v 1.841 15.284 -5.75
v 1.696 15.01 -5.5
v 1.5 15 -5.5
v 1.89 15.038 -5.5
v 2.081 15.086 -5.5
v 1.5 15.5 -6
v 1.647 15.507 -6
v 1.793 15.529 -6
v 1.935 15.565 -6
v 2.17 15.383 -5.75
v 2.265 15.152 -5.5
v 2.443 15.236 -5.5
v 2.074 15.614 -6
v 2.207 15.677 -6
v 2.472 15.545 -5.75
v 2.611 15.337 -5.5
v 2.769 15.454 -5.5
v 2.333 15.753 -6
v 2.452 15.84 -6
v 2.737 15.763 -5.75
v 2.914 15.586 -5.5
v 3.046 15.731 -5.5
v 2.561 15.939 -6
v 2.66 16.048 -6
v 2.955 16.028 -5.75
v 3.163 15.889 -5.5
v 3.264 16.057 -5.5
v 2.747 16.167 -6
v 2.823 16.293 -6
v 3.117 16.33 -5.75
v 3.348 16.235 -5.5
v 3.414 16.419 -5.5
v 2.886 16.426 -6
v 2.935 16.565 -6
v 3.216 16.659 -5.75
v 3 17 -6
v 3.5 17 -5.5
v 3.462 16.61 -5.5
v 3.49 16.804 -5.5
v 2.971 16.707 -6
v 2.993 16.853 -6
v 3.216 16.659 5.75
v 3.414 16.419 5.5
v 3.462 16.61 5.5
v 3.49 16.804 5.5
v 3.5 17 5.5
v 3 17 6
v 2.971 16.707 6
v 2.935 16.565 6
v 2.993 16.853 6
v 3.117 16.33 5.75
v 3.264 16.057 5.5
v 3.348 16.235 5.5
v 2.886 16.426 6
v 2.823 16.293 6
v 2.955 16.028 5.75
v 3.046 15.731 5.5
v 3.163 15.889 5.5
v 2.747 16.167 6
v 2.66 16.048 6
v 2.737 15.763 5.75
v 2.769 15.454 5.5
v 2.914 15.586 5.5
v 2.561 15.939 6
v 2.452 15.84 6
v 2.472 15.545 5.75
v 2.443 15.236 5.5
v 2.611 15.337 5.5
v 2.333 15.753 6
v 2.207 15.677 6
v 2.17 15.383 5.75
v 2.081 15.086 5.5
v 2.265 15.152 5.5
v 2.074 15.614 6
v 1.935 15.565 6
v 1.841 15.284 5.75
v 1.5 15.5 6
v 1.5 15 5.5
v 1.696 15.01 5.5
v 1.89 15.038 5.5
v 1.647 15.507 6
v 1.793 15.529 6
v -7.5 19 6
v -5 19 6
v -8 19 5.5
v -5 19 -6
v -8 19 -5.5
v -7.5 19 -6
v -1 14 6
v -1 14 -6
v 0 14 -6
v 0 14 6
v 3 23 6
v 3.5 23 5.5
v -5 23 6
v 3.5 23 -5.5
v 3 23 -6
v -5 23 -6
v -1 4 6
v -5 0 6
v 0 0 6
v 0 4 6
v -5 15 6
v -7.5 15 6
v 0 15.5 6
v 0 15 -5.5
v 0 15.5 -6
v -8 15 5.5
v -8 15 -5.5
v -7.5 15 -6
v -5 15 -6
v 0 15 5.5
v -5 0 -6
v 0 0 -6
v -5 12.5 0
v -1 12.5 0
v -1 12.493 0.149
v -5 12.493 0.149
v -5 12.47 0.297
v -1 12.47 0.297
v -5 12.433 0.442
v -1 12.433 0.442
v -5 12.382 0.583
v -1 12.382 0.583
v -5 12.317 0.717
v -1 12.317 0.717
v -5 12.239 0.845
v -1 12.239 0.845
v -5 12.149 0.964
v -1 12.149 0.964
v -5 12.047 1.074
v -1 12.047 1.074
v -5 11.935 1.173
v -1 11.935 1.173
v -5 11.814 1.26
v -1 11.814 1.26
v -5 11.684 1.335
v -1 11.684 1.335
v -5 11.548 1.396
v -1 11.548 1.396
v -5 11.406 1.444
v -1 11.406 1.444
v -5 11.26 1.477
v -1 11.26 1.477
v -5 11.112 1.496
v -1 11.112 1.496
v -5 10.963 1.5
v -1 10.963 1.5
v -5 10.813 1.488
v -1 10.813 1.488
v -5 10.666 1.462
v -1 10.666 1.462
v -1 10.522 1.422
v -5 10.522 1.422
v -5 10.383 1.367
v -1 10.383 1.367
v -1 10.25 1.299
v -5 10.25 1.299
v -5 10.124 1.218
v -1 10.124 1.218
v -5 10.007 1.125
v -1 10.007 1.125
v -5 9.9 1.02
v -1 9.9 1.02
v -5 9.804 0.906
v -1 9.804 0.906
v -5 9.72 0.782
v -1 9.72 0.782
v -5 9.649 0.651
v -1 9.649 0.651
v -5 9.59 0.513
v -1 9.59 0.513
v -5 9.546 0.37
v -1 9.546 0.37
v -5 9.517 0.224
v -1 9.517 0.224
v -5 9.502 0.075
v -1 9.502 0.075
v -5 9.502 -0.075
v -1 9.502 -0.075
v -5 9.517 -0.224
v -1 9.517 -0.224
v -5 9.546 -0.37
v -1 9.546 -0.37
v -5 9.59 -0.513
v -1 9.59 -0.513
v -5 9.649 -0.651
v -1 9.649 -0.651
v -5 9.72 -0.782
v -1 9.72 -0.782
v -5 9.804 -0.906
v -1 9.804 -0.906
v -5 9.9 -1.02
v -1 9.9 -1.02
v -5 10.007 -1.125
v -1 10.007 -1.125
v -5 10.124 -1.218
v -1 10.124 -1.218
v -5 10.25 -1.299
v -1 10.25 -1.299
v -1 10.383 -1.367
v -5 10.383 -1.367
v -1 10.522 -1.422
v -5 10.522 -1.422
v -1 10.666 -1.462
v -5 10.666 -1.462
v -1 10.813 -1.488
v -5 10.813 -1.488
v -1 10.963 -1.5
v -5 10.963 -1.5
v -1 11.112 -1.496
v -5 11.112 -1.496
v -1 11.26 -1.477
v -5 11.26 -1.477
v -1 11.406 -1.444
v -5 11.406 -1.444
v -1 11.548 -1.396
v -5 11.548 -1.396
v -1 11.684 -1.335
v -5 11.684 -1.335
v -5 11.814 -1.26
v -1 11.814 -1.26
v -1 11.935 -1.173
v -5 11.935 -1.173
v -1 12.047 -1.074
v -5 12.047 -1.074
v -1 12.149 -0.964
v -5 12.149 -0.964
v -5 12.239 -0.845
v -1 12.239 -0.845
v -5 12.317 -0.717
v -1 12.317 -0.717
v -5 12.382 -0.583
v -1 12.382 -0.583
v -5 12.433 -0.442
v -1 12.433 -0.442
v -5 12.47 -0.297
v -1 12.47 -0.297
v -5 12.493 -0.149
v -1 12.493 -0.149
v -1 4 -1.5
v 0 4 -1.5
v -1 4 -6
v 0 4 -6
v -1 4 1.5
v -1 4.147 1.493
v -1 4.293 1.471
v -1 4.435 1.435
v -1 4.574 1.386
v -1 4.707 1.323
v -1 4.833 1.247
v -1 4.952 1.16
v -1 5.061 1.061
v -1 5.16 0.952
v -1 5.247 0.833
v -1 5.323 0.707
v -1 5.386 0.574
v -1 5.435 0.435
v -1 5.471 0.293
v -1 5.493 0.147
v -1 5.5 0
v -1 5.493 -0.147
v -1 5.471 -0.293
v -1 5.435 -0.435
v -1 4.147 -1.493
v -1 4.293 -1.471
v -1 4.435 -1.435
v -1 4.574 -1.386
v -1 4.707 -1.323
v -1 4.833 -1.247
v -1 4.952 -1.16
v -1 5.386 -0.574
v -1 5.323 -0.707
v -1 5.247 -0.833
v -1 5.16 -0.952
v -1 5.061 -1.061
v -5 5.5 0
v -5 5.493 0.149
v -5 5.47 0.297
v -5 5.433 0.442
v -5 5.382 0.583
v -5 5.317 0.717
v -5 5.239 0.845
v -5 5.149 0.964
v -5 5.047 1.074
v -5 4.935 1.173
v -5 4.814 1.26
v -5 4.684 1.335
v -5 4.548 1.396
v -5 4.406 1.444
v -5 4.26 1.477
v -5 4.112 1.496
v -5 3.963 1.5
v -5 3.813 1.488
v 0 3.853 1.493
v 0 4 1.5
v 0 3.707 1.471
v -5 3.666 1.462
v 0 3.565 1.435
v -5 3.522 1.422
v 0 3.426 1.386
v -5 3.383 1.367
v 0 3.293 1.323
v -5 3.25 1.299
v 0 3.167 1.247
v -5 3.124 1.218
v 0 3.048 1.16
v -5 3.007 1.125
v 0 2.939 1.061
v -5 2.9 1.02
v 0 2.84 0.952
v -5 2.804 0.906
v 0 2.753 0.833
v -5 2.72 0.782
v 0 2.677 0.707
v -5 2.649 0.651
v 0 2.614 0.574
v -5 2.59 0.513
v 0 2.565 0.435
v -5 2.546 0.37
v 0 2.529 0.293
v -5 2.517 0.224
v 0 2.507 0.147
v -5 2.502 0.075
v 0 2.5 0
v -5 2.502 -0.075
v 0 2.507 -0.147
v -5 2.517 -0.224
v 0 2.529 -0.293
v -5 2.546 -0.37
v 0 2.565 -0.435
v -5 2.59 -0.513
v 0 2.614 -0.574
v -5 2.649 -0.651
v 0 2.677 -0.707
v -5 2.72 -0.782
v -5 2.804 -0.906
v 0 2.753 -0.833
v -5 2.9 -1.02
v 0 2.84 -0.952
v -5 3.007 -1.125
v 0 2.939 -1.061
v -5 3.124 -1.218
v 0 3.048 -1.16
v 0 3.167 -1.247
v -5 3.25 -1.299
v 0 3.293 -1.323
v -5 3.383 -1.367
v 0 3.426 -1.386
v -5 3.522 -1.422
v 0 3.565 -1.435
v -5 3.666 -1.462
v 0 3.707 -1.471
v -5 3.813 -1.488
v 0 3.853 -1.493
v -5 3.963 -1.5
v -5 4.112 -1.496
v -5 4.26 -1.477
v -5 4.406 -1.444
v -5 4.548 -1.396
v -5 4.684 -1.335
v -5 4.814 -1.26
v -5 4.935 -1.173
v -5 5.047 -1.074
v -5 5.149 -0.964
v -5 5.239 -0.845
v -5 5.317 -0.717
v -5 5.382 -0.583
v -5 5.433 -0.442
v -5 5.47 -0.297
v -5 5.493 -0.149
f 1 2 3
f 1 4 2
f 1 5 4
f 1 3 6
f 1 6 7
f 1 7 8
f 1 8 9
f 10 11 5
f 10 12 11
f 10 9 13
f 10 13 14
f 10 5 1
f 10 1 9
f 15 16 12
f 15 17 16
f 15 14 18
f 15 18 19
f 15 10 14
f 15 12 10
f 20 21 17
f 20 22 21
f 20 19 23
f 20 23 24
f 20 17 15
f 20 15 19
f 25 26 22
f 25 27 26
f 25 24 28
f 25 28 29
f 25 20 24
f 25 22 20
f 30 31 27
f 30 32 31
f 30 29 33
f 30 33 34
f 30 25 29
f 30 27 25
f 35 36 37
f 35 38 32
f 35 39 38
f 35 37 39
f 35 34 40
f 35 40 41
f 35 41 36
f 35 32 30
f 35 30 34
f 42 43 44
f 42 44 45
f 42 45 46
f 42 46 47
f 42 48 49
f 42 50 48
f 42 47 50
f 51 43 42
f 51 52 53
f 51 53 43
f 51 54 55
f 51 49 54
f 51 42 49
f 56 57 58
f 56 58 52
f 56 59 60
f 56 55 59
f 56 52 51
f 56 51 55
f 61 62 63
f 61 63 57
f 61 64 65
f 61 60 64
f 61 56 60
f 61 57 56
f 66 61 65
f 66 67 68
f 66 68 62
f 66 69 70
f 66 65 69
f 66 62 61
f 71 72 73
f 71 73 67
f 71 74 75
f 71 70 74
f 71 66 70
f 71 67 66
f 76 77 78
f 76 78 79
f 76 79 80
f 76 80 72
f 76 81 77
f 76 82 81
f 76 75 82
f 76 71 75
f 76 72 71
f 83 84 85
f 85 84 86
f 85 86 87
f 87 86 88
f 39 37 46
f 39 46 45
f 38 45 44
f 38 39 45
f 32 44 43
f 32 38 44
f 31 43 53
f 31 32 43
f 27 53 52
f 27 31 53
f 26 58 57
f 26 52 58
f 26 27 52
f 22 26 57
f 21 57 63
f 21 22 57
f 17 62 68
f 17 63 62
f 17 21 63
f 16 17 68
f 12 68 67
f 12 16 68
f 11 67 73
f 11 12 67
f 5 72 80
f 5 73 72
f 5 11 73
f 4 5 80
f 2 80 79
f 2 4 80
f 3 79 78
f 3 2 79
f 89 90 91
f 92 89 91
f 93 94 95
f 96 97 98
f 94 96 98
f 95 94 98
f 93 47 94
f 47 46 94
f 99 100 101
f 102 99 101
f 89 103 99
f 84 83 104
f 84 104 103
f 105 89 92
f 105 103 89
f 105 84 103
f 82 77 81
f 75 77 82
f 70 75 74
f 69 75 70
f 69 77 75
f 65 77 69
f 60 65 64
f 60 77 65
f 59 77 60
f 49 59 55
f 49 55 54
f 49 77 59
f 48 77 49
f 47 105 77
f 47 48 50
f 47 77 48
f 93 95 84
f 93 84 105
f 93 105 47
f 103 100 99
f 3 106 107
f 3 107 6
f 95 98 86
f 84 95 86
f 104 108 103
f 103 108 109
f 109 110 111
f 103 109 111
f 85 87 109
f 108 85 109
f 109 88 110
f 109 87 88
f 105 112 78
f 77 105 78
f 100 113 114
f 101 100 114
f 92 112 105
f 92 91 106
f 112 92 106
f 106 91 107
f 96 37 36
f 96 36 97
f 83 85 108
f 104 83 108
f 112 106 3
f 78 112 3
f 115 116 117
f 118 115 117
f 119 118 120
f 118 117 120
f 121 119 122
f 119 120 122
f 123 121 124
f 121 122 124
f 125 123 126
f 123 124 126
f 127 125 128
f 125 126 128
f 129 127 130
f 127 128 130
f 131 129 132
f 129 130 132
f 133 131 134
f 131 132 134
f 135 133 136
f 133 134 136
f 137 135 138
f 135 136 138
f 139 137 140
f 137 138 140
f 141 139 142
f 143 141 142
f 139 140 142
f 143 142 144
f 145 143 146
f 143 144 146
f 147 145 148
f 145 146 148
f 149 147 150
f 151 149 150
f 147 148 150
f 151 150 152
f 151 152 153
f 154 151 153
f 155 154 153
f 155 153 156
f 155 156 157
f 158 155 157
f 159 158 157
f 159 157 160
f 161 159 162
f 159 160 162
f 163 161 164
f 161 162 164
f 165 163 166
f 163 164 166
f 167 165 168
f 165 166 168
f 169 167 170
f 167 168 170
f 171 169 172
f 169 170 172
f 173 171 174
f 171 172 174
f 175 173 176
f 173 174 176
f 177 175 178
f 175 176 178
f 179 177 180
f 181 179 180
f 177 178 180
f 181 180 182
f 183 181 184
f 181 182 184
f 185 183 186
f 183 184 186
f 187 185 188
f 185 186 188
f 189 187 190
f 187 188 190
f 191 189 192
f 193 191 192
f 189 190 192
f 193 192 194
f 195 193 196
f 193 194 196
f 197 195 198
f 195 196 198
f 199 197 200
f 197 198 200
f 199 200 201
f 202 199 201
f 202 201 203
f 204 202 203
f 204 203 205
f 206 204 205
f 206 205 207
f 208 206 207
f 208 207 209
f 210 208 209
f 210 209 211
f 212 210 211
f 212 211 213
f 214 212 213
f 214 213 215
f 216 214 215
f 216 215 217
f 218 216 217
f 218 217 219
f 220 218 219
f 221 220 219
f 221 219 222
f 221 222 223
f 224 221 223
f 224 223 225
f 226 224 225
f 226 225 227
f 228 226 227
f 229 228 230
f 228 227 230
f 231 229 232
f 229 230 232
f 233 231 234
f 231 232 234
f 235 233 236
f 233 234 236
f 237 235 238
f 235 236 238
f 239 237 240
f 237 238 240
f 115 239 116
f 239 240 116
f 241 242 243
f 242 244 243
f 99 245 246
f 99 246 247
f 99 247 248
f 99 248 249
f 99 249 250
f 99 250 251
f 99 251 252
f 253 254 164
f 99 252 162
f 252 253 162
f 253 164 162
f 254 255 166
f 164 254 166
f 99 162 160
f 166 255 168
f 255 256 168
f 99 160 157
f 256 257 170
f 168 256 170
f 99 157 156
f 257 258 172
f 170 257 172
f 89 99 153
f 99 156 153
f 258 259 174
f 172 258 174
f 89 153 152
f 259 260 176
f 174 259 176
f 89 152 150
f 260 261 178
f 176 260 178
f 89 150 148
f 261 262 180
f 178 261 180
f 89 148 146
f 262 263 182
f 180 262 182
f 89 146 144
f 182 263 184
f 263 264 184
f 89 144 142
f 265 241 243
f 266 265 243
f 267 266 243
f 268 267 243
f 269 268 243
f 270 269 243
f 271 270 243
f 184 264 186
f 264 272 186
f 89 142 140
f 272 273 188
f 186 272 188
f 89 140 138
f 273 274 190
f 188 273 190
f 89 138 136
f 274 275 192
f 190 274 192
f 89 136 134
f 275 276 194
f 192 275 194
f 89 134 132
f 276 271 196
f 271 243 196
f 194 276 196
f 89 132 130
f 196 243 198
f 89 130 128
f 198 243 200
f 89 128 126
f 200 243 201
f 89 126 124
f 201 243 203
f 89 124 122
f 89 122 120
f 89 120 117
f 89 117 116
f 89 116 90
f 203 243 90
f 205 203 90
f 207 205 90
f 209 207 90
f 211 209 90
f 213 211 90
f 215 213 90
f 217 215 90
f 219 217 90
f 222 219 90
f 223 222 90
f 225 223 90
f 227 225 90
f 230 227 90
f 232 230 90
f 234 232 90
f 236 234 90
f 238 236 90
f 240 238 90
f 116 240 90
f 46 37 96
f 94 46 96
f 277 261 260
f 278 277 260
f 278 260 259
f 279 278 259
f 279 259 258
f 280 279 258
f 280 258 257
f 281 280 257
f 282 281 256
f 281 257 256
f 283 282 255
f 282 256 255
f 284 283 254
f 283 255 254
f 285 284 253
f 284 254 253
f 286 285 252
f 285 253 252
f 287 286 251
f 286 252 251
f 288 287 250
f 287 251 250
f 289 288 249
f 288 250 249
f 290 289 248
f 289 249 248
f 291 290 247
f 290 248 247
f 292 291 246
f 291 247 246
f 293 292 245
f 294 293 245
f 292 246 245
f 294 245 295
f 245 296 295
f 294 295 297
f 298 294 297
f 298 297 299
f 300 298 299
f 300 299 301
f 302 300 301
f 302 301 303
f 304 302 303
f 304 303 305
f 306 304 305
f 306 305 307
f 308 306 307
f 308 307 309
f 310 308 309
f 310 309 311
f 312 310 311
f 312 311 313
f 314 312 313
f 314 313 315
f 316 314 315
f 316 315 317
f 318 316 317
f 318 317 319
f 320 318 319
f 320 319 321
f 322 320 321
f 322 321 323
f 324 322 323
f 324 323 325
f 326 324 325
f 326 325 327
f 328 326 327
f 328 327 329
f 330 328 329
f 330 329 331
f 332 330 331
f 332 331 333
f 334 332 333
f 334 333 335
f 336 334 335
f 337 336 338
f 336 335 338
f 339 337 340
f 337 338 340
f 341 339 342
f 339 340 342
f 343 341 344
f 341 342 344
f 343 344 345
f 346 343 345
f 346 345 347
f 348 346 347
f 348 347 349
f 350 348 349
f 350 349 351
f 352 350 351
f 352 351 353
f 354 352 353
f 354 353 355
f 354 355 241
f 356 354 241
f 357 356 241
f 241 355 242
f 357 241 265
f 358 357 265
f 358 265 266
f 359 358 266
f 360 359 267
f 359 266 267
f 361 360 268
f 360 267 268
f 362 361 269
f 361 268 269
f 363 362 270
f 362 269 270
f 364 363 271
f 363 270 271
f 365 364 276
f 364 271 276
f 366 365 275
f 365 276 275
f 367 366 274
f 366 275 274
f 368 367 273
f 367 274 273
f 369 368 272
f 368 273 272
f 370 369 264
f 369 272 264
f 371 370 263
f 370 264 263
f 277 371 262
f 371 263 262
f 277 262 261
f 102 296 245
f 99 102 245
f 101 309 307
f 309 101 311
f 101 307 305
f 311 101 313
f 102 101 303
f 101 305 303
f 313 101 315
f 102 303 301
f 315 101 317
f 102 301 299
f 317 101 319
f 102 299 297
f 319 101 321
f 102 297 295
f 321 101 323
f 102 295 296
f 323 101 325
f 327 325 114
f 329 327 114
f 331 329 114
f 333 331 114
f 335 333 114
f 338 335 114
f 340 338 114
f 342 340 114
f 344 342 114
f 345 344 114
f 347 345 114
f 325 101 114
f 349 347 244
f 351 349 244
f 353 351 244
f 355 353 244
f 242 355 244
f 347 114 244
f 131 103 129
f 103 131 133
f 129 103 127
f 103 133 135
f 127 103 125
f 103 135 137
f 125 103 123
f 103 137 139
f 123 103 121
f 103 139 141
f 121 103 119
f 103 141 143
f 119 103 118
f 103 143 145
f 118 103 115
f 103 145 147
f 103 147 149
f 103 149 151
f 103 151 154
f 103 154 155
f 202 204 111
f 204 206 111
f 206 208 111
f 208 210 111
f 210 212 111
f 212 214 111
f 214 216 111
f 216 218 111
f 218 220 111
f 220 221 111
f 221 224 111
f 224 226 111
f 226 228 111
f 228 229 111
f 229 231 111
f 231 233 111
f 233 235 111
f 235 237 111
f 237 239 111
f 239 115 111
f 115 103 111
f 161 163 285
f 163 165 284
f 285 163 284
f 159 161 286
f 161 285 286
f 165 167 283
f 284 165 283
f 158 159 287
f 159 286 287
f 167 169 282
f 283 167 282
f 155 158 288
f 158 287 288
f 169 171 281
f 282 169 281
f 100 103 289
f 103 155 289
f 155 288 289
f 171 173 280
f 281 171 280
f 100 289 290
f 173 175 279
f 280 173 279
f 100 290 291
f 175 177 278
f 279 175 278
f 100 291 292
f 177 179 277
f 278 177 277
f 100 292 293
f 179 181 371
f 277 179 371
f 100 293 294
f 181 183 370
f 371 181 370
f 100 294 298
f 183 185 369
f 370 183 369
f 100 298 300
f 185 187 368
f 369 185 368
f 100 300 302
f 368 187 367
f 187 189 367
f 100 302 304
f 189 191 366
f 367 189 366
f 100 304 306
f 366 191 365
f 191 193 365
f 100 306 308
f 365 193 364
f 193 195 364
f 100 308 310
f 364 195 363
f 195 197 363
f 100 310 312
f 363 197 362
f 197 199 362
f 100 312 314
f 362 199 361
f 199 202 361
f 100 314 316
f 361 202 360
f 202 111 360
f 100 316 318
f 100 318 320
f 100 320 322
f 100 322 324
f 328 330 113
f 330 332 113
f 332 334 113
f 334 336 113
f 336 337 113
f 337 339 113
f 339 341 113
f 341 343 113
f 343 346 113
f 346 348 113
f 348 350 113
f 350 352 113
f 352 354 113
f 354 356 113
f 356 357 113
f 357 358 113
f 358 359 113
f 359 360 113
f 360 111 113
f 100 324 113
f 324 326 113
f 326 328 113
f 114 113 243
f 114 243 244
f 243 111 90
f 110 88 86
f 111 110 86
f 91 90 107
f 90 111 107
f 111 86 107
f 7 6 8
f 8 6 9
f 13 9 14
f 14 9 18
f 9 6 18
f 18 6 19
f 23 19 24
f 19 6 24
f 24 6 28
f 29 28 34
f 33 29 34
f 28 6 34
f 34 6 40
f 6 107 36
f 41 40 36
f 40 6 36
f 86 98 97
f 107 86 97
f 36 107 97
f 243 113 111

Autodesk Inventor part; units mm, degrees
ref_plane "YZ Plane" through (0, 0, 0) normal (1, 0, 0) x (0, 1, 0)
ref_plane "XZ Plane" through (0, 0, 0) normal (0, 1, 0) x (-1, 0, 0)
ref_plane "XY Plane" through (0, 0, 0) normal (0, 0, 1) x (1, 0, 0)
sketch "Sketch1" plane through (0, 0, 0) normal (0, 0, 1) x (1, 0, 0)
  line L0 (0, 0) -> (0, 4)
  line L1 (0, 4) -> (-1, 4)
  line L2 (-1, 4) -> (-1, 14)
  line L3 (-1, 14) -> (0, 14)
  line L4 (0, 14) -> (0, 15)
  line L5 (0, 15) -> (1.5, 15)
  line L6 (3.5, 17) -> (3.5, 23)
  line L7 (3.5, 23) -> (-5, 23)
  line L8 (-5, 23) -> (-5, 19)
  line L9 (-5, 19) -> (-8, 19)
  line L10 (-8, 19) -> (-8, 15)
  line L11 (-8, 15) -> (-5, 15)
  line L12 (-5, 15) -> (-5, 0)
  line L13 (-5, 0) -> (0, 0)
  arc A0 (1.5, 15) -> (3.5, 17) centre (1.5, 17) ccw
  point P0 (0.75, 15)
  point P1 (-0.5, 4)
  point P2 (0, 2)
  point P3 (-6.5, 15)
  point P4 (-6.5, 19)
  point P5 (-5, 21)
  dimension "d3" = 4
  dimension "d4" = 14
  dimension "d6" = 1
  dimension "d7" = 1
  dimension "d8" = 5
  dimension "d9" = 8
  dimension "d10" = 3
  dimension "d12" = 0
  dimension "d13" = 4
  dimension "d14" = 2
  dimension "d15" = 8.5
  dimension "d16" = 5
extrude "Extrusion1" add sketch "Sketch1" along normal mid plane 12
chamfer "Chamfer1" distance 0.5 angle 45 8 edges at (3.5, 20, 6) (2.9142, 15.5858, 6) (0.75, 15, 6) (-8, 17, 6) (3.5, 20, -6) (2.9142, 15.5858, -6) (0.75, 15, -6) (-8, 17, -6)
sketch "Sketch2" plane through (0, 0, 0) normal (1, 0, 0) x (0, 1, 0)
  circle A0 centre (4, 0) radius 1.5
  circle A1 centre (11, 0) radius 1.5
  line L0 (14, -6) -> (14, 6) projected
  line L1 (0, -6) -> (0, 6) projected
  point P0 (0, 0)
  point P1 (0, 0)
  point P2 (0, 0)
  dimension "d22" = 3
  dimension "d23" = 3
  dimension "d24" = 7
  dimension "d25" = 3
  dimension "d26" = 0
  dimension "d27" = 0
extrude "Extrusion2" cut sketch "Sketch2" against normal through all
properties part number "connector"
